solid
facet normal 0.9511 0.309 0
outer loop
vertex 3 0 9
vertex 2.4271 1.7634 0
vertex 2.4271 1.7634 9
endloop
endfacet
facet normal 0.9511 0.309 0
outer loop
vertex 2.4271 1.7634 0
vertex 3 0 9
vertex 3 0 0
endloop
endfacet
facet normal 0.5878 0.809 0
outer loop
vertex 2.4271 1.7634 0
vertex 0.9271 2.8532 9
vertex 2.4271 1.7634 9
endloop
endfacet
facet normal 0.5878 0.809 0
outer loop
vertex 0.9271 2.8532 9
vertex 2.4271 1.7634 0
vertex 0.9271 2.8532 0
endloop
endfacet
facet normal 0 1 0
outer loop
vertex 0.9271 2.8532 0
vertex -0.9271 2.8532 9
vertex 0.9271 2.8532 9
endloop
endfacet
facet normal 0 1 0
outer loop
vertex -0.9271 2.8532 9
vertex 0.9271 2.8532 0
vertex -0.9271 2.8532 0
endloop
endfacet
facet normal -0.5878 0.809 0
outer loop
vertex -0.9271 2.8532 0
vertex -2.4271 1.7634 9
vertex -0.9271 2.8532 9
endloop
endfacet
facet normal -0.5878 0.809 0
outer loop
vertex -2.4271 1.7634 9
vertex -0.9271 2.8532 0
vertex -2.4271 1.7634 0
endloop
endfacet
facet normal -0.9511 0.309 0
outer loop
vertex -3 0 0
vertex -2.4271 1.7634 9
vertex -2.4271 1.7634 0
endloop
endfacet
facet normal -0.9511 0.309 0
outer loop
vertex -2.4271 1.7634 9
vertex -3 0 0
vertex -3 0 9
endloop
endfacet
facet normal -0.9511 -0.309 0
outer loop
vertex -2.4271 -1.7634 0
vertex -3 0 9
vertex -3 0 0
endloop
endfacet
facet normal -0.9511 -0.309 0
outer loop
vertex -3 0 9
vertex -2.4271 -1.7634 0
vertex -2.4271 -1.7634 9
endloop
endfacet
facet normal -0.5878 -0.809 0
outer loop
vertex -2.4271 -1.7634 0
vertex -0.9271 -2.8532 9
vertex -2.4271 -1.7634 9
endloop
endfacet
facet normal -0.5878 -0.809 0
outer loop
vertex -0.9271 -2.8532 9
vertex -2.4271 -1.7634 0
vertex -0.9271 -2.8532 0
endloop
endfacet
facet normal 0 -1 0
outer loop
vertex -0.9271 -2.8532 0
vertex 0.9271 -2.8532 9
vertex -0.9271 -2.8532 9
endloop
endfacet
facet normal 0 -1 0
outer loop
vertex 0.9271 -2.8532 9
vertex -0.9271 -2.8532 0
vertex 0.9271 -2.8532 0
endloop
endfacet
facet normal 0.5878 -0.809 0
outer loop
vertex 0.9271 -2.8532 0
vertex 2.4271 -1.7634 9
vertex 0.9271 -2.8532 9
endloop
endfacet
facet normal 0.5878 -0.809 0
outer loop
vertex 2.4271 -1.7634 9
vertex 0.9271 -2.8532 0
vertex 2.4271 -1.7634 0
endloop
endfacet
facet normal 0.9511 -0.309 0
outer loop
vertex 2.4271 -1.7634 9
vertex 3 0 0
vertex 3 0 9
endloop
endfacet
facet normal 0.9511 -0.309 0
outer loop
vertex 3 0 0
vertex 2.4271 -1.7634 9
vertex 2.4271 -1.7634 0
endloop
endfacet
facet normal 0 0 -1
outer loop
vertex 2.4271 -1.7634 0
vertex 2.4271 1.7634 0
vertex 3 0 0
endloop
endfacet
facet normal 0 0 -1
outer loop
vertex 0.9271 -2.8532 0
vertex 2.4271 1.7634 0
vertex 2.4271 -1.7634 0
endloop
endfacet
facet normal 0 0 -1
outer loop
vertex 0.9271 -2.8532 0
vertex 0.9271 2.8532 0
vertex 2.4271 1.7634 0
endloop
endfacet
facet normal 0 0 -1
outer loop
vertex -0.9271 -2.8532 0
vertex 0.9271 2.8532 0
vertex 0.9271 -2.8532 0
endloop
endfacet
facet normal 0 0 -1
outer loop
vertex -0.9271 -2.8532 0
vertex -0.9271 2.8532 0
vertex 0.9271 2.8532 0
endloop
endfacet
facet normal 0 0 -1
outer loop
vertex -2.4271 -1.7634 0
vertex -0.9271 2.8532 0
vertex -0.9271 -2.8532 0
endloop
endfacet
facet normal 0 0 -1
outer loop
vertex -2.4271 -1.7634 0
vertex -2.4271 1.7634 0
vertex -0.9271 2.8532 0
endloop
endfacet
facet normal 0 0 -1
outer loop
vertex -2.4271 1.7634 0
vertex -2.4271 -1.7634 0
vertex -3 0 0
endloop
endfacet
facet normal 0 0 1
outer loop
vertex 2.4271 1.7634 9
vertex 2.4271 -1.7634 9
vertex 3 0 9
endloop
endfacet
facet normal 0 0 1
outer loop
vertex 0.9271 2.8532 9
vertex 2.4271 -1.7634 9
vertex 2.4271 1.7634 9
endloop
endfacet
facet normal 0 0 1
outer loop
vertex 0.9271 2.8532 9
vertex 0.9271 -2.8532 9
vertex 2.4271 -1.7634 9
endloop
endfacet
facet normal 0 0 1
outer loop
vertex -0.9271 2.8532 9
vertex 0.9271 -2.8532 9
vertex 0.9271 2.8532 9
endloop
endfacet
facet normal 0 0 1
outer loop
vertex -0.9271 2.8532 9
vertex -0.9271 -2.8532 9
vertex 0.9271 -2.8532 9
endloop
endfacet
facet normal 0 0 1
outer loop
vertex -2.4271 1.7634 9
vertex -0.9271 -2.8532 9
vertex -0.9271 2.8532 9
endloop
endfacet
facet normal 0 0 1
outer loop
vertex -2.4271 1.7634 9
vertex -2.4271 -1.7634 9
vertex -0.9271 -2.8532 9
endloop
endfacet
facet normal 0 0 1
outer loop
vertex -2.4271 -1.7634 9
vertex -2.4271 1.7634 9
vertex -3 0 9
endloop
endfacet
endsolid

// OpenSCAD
// Generated by SolidPython 1.0.1 on 2020-07-29 00:46:44


cylinder(h = 9, r1 = 3, r2 = 3);
/***********************************************
*********      SolidPython code:      **********
************************************************
 
# import packages: SolidPython
from solid import *
from solid.utils import *
from itertools import chain, combinations, permutations


class Resize:

    def __init__(self, scad_file):
        self.scad_file = scad_file
        #self.scad_file = import_scad(scad_file)
        # cone/cylinder param:
        self.r1 = 0
        self.r2 = 0
        self.h = 0
        # rectangular prism param:
        self.w = 0
        self.l = 0
        # ellipse param:
        self.r = 0

    # import OpenScad code (file name corresponds to shape)


    # classify shape + parameters
    def assign(self, param1, param2, param3):
        if self.scad_file == 'cone.scad':
            self.r1 = param1
            self.r2 = param2
            self.h = param3
        elif self.scad_file == 'cylinder.scad':
            self.r1 = param1
            self.r2 = param2
            self.h = param3
        elif self.scad_file == 'rectangularPrism.scad':
            self.h = param1
            self.l = param2
            self.w = param3
        else:
            self.r = param1
            self.h = param2

    # resize parameters
    def iterate(self):
        x = range(3, 20, 2)
        i = 1
        if self.scad_file == 'cone.scad':
            tempList = list(permutations(x, 2))
            for temp in tempList:
                param1 = temp[0]
                param2 = temp[1]
                filepath = 'produced_scad_files/' + 'cone' + str(param1) + '_' + str(param2) + '_' + '.scad'
                scad_render_to_file(cylinder(h=param1, r1=param2, r2=0), filepath)

        elif self.scad_file == 'cylinder.scad':
            tempList = list(permutations(x, 3))
            for temp in tempList:
                param1 = temp[0]
                param2 = temp[1]
                filepath = 'produced_scad_files/' + 'cylinder' + str(param1) + '_' + str(param2) + '_' + '.scad'
                scad_render_to_file(cylinder(h=param1, r1=param2, r2=param2), filepath)

        elif self.scad_file == 'rectangularPrism.scad':
            tempList = list(permutations(x, 3))
            for temp in tempList:
                param1 = temp[0]
                param2 = temp[1]
                param3 = temp[2]
                filepath = 'produced_scad_files/' + 'rectangularPrism' + str(param1) + '_' + str(param2) + '_' + str(
                    param3) + '.scad'
                scad_render_to_file(cube(size=(param1, param2, param3)), filepath)

        elif self.scad_file == 'ellipse.scad':
            tempList = list(permutations(x, 4))
            for temp in tempList:
                param1 = temp[0]
                param2 = temp[1]
                param3 = temp[2]
                param4 = temp[3]
                filepath = 'produced_scad_files/' + 'ellipse' + str(param1) + '_' + str(param2) + '_' + str(param3) + '_' + str(param4) + '.scad'
                scad_render_to_file(scale([param1, param2, param3])(sphere(r=param4)), filepath)

    def render_to_scadfile(self):
        scad_render_to_file(scad, 'example.scad') 
 
************************************************/
